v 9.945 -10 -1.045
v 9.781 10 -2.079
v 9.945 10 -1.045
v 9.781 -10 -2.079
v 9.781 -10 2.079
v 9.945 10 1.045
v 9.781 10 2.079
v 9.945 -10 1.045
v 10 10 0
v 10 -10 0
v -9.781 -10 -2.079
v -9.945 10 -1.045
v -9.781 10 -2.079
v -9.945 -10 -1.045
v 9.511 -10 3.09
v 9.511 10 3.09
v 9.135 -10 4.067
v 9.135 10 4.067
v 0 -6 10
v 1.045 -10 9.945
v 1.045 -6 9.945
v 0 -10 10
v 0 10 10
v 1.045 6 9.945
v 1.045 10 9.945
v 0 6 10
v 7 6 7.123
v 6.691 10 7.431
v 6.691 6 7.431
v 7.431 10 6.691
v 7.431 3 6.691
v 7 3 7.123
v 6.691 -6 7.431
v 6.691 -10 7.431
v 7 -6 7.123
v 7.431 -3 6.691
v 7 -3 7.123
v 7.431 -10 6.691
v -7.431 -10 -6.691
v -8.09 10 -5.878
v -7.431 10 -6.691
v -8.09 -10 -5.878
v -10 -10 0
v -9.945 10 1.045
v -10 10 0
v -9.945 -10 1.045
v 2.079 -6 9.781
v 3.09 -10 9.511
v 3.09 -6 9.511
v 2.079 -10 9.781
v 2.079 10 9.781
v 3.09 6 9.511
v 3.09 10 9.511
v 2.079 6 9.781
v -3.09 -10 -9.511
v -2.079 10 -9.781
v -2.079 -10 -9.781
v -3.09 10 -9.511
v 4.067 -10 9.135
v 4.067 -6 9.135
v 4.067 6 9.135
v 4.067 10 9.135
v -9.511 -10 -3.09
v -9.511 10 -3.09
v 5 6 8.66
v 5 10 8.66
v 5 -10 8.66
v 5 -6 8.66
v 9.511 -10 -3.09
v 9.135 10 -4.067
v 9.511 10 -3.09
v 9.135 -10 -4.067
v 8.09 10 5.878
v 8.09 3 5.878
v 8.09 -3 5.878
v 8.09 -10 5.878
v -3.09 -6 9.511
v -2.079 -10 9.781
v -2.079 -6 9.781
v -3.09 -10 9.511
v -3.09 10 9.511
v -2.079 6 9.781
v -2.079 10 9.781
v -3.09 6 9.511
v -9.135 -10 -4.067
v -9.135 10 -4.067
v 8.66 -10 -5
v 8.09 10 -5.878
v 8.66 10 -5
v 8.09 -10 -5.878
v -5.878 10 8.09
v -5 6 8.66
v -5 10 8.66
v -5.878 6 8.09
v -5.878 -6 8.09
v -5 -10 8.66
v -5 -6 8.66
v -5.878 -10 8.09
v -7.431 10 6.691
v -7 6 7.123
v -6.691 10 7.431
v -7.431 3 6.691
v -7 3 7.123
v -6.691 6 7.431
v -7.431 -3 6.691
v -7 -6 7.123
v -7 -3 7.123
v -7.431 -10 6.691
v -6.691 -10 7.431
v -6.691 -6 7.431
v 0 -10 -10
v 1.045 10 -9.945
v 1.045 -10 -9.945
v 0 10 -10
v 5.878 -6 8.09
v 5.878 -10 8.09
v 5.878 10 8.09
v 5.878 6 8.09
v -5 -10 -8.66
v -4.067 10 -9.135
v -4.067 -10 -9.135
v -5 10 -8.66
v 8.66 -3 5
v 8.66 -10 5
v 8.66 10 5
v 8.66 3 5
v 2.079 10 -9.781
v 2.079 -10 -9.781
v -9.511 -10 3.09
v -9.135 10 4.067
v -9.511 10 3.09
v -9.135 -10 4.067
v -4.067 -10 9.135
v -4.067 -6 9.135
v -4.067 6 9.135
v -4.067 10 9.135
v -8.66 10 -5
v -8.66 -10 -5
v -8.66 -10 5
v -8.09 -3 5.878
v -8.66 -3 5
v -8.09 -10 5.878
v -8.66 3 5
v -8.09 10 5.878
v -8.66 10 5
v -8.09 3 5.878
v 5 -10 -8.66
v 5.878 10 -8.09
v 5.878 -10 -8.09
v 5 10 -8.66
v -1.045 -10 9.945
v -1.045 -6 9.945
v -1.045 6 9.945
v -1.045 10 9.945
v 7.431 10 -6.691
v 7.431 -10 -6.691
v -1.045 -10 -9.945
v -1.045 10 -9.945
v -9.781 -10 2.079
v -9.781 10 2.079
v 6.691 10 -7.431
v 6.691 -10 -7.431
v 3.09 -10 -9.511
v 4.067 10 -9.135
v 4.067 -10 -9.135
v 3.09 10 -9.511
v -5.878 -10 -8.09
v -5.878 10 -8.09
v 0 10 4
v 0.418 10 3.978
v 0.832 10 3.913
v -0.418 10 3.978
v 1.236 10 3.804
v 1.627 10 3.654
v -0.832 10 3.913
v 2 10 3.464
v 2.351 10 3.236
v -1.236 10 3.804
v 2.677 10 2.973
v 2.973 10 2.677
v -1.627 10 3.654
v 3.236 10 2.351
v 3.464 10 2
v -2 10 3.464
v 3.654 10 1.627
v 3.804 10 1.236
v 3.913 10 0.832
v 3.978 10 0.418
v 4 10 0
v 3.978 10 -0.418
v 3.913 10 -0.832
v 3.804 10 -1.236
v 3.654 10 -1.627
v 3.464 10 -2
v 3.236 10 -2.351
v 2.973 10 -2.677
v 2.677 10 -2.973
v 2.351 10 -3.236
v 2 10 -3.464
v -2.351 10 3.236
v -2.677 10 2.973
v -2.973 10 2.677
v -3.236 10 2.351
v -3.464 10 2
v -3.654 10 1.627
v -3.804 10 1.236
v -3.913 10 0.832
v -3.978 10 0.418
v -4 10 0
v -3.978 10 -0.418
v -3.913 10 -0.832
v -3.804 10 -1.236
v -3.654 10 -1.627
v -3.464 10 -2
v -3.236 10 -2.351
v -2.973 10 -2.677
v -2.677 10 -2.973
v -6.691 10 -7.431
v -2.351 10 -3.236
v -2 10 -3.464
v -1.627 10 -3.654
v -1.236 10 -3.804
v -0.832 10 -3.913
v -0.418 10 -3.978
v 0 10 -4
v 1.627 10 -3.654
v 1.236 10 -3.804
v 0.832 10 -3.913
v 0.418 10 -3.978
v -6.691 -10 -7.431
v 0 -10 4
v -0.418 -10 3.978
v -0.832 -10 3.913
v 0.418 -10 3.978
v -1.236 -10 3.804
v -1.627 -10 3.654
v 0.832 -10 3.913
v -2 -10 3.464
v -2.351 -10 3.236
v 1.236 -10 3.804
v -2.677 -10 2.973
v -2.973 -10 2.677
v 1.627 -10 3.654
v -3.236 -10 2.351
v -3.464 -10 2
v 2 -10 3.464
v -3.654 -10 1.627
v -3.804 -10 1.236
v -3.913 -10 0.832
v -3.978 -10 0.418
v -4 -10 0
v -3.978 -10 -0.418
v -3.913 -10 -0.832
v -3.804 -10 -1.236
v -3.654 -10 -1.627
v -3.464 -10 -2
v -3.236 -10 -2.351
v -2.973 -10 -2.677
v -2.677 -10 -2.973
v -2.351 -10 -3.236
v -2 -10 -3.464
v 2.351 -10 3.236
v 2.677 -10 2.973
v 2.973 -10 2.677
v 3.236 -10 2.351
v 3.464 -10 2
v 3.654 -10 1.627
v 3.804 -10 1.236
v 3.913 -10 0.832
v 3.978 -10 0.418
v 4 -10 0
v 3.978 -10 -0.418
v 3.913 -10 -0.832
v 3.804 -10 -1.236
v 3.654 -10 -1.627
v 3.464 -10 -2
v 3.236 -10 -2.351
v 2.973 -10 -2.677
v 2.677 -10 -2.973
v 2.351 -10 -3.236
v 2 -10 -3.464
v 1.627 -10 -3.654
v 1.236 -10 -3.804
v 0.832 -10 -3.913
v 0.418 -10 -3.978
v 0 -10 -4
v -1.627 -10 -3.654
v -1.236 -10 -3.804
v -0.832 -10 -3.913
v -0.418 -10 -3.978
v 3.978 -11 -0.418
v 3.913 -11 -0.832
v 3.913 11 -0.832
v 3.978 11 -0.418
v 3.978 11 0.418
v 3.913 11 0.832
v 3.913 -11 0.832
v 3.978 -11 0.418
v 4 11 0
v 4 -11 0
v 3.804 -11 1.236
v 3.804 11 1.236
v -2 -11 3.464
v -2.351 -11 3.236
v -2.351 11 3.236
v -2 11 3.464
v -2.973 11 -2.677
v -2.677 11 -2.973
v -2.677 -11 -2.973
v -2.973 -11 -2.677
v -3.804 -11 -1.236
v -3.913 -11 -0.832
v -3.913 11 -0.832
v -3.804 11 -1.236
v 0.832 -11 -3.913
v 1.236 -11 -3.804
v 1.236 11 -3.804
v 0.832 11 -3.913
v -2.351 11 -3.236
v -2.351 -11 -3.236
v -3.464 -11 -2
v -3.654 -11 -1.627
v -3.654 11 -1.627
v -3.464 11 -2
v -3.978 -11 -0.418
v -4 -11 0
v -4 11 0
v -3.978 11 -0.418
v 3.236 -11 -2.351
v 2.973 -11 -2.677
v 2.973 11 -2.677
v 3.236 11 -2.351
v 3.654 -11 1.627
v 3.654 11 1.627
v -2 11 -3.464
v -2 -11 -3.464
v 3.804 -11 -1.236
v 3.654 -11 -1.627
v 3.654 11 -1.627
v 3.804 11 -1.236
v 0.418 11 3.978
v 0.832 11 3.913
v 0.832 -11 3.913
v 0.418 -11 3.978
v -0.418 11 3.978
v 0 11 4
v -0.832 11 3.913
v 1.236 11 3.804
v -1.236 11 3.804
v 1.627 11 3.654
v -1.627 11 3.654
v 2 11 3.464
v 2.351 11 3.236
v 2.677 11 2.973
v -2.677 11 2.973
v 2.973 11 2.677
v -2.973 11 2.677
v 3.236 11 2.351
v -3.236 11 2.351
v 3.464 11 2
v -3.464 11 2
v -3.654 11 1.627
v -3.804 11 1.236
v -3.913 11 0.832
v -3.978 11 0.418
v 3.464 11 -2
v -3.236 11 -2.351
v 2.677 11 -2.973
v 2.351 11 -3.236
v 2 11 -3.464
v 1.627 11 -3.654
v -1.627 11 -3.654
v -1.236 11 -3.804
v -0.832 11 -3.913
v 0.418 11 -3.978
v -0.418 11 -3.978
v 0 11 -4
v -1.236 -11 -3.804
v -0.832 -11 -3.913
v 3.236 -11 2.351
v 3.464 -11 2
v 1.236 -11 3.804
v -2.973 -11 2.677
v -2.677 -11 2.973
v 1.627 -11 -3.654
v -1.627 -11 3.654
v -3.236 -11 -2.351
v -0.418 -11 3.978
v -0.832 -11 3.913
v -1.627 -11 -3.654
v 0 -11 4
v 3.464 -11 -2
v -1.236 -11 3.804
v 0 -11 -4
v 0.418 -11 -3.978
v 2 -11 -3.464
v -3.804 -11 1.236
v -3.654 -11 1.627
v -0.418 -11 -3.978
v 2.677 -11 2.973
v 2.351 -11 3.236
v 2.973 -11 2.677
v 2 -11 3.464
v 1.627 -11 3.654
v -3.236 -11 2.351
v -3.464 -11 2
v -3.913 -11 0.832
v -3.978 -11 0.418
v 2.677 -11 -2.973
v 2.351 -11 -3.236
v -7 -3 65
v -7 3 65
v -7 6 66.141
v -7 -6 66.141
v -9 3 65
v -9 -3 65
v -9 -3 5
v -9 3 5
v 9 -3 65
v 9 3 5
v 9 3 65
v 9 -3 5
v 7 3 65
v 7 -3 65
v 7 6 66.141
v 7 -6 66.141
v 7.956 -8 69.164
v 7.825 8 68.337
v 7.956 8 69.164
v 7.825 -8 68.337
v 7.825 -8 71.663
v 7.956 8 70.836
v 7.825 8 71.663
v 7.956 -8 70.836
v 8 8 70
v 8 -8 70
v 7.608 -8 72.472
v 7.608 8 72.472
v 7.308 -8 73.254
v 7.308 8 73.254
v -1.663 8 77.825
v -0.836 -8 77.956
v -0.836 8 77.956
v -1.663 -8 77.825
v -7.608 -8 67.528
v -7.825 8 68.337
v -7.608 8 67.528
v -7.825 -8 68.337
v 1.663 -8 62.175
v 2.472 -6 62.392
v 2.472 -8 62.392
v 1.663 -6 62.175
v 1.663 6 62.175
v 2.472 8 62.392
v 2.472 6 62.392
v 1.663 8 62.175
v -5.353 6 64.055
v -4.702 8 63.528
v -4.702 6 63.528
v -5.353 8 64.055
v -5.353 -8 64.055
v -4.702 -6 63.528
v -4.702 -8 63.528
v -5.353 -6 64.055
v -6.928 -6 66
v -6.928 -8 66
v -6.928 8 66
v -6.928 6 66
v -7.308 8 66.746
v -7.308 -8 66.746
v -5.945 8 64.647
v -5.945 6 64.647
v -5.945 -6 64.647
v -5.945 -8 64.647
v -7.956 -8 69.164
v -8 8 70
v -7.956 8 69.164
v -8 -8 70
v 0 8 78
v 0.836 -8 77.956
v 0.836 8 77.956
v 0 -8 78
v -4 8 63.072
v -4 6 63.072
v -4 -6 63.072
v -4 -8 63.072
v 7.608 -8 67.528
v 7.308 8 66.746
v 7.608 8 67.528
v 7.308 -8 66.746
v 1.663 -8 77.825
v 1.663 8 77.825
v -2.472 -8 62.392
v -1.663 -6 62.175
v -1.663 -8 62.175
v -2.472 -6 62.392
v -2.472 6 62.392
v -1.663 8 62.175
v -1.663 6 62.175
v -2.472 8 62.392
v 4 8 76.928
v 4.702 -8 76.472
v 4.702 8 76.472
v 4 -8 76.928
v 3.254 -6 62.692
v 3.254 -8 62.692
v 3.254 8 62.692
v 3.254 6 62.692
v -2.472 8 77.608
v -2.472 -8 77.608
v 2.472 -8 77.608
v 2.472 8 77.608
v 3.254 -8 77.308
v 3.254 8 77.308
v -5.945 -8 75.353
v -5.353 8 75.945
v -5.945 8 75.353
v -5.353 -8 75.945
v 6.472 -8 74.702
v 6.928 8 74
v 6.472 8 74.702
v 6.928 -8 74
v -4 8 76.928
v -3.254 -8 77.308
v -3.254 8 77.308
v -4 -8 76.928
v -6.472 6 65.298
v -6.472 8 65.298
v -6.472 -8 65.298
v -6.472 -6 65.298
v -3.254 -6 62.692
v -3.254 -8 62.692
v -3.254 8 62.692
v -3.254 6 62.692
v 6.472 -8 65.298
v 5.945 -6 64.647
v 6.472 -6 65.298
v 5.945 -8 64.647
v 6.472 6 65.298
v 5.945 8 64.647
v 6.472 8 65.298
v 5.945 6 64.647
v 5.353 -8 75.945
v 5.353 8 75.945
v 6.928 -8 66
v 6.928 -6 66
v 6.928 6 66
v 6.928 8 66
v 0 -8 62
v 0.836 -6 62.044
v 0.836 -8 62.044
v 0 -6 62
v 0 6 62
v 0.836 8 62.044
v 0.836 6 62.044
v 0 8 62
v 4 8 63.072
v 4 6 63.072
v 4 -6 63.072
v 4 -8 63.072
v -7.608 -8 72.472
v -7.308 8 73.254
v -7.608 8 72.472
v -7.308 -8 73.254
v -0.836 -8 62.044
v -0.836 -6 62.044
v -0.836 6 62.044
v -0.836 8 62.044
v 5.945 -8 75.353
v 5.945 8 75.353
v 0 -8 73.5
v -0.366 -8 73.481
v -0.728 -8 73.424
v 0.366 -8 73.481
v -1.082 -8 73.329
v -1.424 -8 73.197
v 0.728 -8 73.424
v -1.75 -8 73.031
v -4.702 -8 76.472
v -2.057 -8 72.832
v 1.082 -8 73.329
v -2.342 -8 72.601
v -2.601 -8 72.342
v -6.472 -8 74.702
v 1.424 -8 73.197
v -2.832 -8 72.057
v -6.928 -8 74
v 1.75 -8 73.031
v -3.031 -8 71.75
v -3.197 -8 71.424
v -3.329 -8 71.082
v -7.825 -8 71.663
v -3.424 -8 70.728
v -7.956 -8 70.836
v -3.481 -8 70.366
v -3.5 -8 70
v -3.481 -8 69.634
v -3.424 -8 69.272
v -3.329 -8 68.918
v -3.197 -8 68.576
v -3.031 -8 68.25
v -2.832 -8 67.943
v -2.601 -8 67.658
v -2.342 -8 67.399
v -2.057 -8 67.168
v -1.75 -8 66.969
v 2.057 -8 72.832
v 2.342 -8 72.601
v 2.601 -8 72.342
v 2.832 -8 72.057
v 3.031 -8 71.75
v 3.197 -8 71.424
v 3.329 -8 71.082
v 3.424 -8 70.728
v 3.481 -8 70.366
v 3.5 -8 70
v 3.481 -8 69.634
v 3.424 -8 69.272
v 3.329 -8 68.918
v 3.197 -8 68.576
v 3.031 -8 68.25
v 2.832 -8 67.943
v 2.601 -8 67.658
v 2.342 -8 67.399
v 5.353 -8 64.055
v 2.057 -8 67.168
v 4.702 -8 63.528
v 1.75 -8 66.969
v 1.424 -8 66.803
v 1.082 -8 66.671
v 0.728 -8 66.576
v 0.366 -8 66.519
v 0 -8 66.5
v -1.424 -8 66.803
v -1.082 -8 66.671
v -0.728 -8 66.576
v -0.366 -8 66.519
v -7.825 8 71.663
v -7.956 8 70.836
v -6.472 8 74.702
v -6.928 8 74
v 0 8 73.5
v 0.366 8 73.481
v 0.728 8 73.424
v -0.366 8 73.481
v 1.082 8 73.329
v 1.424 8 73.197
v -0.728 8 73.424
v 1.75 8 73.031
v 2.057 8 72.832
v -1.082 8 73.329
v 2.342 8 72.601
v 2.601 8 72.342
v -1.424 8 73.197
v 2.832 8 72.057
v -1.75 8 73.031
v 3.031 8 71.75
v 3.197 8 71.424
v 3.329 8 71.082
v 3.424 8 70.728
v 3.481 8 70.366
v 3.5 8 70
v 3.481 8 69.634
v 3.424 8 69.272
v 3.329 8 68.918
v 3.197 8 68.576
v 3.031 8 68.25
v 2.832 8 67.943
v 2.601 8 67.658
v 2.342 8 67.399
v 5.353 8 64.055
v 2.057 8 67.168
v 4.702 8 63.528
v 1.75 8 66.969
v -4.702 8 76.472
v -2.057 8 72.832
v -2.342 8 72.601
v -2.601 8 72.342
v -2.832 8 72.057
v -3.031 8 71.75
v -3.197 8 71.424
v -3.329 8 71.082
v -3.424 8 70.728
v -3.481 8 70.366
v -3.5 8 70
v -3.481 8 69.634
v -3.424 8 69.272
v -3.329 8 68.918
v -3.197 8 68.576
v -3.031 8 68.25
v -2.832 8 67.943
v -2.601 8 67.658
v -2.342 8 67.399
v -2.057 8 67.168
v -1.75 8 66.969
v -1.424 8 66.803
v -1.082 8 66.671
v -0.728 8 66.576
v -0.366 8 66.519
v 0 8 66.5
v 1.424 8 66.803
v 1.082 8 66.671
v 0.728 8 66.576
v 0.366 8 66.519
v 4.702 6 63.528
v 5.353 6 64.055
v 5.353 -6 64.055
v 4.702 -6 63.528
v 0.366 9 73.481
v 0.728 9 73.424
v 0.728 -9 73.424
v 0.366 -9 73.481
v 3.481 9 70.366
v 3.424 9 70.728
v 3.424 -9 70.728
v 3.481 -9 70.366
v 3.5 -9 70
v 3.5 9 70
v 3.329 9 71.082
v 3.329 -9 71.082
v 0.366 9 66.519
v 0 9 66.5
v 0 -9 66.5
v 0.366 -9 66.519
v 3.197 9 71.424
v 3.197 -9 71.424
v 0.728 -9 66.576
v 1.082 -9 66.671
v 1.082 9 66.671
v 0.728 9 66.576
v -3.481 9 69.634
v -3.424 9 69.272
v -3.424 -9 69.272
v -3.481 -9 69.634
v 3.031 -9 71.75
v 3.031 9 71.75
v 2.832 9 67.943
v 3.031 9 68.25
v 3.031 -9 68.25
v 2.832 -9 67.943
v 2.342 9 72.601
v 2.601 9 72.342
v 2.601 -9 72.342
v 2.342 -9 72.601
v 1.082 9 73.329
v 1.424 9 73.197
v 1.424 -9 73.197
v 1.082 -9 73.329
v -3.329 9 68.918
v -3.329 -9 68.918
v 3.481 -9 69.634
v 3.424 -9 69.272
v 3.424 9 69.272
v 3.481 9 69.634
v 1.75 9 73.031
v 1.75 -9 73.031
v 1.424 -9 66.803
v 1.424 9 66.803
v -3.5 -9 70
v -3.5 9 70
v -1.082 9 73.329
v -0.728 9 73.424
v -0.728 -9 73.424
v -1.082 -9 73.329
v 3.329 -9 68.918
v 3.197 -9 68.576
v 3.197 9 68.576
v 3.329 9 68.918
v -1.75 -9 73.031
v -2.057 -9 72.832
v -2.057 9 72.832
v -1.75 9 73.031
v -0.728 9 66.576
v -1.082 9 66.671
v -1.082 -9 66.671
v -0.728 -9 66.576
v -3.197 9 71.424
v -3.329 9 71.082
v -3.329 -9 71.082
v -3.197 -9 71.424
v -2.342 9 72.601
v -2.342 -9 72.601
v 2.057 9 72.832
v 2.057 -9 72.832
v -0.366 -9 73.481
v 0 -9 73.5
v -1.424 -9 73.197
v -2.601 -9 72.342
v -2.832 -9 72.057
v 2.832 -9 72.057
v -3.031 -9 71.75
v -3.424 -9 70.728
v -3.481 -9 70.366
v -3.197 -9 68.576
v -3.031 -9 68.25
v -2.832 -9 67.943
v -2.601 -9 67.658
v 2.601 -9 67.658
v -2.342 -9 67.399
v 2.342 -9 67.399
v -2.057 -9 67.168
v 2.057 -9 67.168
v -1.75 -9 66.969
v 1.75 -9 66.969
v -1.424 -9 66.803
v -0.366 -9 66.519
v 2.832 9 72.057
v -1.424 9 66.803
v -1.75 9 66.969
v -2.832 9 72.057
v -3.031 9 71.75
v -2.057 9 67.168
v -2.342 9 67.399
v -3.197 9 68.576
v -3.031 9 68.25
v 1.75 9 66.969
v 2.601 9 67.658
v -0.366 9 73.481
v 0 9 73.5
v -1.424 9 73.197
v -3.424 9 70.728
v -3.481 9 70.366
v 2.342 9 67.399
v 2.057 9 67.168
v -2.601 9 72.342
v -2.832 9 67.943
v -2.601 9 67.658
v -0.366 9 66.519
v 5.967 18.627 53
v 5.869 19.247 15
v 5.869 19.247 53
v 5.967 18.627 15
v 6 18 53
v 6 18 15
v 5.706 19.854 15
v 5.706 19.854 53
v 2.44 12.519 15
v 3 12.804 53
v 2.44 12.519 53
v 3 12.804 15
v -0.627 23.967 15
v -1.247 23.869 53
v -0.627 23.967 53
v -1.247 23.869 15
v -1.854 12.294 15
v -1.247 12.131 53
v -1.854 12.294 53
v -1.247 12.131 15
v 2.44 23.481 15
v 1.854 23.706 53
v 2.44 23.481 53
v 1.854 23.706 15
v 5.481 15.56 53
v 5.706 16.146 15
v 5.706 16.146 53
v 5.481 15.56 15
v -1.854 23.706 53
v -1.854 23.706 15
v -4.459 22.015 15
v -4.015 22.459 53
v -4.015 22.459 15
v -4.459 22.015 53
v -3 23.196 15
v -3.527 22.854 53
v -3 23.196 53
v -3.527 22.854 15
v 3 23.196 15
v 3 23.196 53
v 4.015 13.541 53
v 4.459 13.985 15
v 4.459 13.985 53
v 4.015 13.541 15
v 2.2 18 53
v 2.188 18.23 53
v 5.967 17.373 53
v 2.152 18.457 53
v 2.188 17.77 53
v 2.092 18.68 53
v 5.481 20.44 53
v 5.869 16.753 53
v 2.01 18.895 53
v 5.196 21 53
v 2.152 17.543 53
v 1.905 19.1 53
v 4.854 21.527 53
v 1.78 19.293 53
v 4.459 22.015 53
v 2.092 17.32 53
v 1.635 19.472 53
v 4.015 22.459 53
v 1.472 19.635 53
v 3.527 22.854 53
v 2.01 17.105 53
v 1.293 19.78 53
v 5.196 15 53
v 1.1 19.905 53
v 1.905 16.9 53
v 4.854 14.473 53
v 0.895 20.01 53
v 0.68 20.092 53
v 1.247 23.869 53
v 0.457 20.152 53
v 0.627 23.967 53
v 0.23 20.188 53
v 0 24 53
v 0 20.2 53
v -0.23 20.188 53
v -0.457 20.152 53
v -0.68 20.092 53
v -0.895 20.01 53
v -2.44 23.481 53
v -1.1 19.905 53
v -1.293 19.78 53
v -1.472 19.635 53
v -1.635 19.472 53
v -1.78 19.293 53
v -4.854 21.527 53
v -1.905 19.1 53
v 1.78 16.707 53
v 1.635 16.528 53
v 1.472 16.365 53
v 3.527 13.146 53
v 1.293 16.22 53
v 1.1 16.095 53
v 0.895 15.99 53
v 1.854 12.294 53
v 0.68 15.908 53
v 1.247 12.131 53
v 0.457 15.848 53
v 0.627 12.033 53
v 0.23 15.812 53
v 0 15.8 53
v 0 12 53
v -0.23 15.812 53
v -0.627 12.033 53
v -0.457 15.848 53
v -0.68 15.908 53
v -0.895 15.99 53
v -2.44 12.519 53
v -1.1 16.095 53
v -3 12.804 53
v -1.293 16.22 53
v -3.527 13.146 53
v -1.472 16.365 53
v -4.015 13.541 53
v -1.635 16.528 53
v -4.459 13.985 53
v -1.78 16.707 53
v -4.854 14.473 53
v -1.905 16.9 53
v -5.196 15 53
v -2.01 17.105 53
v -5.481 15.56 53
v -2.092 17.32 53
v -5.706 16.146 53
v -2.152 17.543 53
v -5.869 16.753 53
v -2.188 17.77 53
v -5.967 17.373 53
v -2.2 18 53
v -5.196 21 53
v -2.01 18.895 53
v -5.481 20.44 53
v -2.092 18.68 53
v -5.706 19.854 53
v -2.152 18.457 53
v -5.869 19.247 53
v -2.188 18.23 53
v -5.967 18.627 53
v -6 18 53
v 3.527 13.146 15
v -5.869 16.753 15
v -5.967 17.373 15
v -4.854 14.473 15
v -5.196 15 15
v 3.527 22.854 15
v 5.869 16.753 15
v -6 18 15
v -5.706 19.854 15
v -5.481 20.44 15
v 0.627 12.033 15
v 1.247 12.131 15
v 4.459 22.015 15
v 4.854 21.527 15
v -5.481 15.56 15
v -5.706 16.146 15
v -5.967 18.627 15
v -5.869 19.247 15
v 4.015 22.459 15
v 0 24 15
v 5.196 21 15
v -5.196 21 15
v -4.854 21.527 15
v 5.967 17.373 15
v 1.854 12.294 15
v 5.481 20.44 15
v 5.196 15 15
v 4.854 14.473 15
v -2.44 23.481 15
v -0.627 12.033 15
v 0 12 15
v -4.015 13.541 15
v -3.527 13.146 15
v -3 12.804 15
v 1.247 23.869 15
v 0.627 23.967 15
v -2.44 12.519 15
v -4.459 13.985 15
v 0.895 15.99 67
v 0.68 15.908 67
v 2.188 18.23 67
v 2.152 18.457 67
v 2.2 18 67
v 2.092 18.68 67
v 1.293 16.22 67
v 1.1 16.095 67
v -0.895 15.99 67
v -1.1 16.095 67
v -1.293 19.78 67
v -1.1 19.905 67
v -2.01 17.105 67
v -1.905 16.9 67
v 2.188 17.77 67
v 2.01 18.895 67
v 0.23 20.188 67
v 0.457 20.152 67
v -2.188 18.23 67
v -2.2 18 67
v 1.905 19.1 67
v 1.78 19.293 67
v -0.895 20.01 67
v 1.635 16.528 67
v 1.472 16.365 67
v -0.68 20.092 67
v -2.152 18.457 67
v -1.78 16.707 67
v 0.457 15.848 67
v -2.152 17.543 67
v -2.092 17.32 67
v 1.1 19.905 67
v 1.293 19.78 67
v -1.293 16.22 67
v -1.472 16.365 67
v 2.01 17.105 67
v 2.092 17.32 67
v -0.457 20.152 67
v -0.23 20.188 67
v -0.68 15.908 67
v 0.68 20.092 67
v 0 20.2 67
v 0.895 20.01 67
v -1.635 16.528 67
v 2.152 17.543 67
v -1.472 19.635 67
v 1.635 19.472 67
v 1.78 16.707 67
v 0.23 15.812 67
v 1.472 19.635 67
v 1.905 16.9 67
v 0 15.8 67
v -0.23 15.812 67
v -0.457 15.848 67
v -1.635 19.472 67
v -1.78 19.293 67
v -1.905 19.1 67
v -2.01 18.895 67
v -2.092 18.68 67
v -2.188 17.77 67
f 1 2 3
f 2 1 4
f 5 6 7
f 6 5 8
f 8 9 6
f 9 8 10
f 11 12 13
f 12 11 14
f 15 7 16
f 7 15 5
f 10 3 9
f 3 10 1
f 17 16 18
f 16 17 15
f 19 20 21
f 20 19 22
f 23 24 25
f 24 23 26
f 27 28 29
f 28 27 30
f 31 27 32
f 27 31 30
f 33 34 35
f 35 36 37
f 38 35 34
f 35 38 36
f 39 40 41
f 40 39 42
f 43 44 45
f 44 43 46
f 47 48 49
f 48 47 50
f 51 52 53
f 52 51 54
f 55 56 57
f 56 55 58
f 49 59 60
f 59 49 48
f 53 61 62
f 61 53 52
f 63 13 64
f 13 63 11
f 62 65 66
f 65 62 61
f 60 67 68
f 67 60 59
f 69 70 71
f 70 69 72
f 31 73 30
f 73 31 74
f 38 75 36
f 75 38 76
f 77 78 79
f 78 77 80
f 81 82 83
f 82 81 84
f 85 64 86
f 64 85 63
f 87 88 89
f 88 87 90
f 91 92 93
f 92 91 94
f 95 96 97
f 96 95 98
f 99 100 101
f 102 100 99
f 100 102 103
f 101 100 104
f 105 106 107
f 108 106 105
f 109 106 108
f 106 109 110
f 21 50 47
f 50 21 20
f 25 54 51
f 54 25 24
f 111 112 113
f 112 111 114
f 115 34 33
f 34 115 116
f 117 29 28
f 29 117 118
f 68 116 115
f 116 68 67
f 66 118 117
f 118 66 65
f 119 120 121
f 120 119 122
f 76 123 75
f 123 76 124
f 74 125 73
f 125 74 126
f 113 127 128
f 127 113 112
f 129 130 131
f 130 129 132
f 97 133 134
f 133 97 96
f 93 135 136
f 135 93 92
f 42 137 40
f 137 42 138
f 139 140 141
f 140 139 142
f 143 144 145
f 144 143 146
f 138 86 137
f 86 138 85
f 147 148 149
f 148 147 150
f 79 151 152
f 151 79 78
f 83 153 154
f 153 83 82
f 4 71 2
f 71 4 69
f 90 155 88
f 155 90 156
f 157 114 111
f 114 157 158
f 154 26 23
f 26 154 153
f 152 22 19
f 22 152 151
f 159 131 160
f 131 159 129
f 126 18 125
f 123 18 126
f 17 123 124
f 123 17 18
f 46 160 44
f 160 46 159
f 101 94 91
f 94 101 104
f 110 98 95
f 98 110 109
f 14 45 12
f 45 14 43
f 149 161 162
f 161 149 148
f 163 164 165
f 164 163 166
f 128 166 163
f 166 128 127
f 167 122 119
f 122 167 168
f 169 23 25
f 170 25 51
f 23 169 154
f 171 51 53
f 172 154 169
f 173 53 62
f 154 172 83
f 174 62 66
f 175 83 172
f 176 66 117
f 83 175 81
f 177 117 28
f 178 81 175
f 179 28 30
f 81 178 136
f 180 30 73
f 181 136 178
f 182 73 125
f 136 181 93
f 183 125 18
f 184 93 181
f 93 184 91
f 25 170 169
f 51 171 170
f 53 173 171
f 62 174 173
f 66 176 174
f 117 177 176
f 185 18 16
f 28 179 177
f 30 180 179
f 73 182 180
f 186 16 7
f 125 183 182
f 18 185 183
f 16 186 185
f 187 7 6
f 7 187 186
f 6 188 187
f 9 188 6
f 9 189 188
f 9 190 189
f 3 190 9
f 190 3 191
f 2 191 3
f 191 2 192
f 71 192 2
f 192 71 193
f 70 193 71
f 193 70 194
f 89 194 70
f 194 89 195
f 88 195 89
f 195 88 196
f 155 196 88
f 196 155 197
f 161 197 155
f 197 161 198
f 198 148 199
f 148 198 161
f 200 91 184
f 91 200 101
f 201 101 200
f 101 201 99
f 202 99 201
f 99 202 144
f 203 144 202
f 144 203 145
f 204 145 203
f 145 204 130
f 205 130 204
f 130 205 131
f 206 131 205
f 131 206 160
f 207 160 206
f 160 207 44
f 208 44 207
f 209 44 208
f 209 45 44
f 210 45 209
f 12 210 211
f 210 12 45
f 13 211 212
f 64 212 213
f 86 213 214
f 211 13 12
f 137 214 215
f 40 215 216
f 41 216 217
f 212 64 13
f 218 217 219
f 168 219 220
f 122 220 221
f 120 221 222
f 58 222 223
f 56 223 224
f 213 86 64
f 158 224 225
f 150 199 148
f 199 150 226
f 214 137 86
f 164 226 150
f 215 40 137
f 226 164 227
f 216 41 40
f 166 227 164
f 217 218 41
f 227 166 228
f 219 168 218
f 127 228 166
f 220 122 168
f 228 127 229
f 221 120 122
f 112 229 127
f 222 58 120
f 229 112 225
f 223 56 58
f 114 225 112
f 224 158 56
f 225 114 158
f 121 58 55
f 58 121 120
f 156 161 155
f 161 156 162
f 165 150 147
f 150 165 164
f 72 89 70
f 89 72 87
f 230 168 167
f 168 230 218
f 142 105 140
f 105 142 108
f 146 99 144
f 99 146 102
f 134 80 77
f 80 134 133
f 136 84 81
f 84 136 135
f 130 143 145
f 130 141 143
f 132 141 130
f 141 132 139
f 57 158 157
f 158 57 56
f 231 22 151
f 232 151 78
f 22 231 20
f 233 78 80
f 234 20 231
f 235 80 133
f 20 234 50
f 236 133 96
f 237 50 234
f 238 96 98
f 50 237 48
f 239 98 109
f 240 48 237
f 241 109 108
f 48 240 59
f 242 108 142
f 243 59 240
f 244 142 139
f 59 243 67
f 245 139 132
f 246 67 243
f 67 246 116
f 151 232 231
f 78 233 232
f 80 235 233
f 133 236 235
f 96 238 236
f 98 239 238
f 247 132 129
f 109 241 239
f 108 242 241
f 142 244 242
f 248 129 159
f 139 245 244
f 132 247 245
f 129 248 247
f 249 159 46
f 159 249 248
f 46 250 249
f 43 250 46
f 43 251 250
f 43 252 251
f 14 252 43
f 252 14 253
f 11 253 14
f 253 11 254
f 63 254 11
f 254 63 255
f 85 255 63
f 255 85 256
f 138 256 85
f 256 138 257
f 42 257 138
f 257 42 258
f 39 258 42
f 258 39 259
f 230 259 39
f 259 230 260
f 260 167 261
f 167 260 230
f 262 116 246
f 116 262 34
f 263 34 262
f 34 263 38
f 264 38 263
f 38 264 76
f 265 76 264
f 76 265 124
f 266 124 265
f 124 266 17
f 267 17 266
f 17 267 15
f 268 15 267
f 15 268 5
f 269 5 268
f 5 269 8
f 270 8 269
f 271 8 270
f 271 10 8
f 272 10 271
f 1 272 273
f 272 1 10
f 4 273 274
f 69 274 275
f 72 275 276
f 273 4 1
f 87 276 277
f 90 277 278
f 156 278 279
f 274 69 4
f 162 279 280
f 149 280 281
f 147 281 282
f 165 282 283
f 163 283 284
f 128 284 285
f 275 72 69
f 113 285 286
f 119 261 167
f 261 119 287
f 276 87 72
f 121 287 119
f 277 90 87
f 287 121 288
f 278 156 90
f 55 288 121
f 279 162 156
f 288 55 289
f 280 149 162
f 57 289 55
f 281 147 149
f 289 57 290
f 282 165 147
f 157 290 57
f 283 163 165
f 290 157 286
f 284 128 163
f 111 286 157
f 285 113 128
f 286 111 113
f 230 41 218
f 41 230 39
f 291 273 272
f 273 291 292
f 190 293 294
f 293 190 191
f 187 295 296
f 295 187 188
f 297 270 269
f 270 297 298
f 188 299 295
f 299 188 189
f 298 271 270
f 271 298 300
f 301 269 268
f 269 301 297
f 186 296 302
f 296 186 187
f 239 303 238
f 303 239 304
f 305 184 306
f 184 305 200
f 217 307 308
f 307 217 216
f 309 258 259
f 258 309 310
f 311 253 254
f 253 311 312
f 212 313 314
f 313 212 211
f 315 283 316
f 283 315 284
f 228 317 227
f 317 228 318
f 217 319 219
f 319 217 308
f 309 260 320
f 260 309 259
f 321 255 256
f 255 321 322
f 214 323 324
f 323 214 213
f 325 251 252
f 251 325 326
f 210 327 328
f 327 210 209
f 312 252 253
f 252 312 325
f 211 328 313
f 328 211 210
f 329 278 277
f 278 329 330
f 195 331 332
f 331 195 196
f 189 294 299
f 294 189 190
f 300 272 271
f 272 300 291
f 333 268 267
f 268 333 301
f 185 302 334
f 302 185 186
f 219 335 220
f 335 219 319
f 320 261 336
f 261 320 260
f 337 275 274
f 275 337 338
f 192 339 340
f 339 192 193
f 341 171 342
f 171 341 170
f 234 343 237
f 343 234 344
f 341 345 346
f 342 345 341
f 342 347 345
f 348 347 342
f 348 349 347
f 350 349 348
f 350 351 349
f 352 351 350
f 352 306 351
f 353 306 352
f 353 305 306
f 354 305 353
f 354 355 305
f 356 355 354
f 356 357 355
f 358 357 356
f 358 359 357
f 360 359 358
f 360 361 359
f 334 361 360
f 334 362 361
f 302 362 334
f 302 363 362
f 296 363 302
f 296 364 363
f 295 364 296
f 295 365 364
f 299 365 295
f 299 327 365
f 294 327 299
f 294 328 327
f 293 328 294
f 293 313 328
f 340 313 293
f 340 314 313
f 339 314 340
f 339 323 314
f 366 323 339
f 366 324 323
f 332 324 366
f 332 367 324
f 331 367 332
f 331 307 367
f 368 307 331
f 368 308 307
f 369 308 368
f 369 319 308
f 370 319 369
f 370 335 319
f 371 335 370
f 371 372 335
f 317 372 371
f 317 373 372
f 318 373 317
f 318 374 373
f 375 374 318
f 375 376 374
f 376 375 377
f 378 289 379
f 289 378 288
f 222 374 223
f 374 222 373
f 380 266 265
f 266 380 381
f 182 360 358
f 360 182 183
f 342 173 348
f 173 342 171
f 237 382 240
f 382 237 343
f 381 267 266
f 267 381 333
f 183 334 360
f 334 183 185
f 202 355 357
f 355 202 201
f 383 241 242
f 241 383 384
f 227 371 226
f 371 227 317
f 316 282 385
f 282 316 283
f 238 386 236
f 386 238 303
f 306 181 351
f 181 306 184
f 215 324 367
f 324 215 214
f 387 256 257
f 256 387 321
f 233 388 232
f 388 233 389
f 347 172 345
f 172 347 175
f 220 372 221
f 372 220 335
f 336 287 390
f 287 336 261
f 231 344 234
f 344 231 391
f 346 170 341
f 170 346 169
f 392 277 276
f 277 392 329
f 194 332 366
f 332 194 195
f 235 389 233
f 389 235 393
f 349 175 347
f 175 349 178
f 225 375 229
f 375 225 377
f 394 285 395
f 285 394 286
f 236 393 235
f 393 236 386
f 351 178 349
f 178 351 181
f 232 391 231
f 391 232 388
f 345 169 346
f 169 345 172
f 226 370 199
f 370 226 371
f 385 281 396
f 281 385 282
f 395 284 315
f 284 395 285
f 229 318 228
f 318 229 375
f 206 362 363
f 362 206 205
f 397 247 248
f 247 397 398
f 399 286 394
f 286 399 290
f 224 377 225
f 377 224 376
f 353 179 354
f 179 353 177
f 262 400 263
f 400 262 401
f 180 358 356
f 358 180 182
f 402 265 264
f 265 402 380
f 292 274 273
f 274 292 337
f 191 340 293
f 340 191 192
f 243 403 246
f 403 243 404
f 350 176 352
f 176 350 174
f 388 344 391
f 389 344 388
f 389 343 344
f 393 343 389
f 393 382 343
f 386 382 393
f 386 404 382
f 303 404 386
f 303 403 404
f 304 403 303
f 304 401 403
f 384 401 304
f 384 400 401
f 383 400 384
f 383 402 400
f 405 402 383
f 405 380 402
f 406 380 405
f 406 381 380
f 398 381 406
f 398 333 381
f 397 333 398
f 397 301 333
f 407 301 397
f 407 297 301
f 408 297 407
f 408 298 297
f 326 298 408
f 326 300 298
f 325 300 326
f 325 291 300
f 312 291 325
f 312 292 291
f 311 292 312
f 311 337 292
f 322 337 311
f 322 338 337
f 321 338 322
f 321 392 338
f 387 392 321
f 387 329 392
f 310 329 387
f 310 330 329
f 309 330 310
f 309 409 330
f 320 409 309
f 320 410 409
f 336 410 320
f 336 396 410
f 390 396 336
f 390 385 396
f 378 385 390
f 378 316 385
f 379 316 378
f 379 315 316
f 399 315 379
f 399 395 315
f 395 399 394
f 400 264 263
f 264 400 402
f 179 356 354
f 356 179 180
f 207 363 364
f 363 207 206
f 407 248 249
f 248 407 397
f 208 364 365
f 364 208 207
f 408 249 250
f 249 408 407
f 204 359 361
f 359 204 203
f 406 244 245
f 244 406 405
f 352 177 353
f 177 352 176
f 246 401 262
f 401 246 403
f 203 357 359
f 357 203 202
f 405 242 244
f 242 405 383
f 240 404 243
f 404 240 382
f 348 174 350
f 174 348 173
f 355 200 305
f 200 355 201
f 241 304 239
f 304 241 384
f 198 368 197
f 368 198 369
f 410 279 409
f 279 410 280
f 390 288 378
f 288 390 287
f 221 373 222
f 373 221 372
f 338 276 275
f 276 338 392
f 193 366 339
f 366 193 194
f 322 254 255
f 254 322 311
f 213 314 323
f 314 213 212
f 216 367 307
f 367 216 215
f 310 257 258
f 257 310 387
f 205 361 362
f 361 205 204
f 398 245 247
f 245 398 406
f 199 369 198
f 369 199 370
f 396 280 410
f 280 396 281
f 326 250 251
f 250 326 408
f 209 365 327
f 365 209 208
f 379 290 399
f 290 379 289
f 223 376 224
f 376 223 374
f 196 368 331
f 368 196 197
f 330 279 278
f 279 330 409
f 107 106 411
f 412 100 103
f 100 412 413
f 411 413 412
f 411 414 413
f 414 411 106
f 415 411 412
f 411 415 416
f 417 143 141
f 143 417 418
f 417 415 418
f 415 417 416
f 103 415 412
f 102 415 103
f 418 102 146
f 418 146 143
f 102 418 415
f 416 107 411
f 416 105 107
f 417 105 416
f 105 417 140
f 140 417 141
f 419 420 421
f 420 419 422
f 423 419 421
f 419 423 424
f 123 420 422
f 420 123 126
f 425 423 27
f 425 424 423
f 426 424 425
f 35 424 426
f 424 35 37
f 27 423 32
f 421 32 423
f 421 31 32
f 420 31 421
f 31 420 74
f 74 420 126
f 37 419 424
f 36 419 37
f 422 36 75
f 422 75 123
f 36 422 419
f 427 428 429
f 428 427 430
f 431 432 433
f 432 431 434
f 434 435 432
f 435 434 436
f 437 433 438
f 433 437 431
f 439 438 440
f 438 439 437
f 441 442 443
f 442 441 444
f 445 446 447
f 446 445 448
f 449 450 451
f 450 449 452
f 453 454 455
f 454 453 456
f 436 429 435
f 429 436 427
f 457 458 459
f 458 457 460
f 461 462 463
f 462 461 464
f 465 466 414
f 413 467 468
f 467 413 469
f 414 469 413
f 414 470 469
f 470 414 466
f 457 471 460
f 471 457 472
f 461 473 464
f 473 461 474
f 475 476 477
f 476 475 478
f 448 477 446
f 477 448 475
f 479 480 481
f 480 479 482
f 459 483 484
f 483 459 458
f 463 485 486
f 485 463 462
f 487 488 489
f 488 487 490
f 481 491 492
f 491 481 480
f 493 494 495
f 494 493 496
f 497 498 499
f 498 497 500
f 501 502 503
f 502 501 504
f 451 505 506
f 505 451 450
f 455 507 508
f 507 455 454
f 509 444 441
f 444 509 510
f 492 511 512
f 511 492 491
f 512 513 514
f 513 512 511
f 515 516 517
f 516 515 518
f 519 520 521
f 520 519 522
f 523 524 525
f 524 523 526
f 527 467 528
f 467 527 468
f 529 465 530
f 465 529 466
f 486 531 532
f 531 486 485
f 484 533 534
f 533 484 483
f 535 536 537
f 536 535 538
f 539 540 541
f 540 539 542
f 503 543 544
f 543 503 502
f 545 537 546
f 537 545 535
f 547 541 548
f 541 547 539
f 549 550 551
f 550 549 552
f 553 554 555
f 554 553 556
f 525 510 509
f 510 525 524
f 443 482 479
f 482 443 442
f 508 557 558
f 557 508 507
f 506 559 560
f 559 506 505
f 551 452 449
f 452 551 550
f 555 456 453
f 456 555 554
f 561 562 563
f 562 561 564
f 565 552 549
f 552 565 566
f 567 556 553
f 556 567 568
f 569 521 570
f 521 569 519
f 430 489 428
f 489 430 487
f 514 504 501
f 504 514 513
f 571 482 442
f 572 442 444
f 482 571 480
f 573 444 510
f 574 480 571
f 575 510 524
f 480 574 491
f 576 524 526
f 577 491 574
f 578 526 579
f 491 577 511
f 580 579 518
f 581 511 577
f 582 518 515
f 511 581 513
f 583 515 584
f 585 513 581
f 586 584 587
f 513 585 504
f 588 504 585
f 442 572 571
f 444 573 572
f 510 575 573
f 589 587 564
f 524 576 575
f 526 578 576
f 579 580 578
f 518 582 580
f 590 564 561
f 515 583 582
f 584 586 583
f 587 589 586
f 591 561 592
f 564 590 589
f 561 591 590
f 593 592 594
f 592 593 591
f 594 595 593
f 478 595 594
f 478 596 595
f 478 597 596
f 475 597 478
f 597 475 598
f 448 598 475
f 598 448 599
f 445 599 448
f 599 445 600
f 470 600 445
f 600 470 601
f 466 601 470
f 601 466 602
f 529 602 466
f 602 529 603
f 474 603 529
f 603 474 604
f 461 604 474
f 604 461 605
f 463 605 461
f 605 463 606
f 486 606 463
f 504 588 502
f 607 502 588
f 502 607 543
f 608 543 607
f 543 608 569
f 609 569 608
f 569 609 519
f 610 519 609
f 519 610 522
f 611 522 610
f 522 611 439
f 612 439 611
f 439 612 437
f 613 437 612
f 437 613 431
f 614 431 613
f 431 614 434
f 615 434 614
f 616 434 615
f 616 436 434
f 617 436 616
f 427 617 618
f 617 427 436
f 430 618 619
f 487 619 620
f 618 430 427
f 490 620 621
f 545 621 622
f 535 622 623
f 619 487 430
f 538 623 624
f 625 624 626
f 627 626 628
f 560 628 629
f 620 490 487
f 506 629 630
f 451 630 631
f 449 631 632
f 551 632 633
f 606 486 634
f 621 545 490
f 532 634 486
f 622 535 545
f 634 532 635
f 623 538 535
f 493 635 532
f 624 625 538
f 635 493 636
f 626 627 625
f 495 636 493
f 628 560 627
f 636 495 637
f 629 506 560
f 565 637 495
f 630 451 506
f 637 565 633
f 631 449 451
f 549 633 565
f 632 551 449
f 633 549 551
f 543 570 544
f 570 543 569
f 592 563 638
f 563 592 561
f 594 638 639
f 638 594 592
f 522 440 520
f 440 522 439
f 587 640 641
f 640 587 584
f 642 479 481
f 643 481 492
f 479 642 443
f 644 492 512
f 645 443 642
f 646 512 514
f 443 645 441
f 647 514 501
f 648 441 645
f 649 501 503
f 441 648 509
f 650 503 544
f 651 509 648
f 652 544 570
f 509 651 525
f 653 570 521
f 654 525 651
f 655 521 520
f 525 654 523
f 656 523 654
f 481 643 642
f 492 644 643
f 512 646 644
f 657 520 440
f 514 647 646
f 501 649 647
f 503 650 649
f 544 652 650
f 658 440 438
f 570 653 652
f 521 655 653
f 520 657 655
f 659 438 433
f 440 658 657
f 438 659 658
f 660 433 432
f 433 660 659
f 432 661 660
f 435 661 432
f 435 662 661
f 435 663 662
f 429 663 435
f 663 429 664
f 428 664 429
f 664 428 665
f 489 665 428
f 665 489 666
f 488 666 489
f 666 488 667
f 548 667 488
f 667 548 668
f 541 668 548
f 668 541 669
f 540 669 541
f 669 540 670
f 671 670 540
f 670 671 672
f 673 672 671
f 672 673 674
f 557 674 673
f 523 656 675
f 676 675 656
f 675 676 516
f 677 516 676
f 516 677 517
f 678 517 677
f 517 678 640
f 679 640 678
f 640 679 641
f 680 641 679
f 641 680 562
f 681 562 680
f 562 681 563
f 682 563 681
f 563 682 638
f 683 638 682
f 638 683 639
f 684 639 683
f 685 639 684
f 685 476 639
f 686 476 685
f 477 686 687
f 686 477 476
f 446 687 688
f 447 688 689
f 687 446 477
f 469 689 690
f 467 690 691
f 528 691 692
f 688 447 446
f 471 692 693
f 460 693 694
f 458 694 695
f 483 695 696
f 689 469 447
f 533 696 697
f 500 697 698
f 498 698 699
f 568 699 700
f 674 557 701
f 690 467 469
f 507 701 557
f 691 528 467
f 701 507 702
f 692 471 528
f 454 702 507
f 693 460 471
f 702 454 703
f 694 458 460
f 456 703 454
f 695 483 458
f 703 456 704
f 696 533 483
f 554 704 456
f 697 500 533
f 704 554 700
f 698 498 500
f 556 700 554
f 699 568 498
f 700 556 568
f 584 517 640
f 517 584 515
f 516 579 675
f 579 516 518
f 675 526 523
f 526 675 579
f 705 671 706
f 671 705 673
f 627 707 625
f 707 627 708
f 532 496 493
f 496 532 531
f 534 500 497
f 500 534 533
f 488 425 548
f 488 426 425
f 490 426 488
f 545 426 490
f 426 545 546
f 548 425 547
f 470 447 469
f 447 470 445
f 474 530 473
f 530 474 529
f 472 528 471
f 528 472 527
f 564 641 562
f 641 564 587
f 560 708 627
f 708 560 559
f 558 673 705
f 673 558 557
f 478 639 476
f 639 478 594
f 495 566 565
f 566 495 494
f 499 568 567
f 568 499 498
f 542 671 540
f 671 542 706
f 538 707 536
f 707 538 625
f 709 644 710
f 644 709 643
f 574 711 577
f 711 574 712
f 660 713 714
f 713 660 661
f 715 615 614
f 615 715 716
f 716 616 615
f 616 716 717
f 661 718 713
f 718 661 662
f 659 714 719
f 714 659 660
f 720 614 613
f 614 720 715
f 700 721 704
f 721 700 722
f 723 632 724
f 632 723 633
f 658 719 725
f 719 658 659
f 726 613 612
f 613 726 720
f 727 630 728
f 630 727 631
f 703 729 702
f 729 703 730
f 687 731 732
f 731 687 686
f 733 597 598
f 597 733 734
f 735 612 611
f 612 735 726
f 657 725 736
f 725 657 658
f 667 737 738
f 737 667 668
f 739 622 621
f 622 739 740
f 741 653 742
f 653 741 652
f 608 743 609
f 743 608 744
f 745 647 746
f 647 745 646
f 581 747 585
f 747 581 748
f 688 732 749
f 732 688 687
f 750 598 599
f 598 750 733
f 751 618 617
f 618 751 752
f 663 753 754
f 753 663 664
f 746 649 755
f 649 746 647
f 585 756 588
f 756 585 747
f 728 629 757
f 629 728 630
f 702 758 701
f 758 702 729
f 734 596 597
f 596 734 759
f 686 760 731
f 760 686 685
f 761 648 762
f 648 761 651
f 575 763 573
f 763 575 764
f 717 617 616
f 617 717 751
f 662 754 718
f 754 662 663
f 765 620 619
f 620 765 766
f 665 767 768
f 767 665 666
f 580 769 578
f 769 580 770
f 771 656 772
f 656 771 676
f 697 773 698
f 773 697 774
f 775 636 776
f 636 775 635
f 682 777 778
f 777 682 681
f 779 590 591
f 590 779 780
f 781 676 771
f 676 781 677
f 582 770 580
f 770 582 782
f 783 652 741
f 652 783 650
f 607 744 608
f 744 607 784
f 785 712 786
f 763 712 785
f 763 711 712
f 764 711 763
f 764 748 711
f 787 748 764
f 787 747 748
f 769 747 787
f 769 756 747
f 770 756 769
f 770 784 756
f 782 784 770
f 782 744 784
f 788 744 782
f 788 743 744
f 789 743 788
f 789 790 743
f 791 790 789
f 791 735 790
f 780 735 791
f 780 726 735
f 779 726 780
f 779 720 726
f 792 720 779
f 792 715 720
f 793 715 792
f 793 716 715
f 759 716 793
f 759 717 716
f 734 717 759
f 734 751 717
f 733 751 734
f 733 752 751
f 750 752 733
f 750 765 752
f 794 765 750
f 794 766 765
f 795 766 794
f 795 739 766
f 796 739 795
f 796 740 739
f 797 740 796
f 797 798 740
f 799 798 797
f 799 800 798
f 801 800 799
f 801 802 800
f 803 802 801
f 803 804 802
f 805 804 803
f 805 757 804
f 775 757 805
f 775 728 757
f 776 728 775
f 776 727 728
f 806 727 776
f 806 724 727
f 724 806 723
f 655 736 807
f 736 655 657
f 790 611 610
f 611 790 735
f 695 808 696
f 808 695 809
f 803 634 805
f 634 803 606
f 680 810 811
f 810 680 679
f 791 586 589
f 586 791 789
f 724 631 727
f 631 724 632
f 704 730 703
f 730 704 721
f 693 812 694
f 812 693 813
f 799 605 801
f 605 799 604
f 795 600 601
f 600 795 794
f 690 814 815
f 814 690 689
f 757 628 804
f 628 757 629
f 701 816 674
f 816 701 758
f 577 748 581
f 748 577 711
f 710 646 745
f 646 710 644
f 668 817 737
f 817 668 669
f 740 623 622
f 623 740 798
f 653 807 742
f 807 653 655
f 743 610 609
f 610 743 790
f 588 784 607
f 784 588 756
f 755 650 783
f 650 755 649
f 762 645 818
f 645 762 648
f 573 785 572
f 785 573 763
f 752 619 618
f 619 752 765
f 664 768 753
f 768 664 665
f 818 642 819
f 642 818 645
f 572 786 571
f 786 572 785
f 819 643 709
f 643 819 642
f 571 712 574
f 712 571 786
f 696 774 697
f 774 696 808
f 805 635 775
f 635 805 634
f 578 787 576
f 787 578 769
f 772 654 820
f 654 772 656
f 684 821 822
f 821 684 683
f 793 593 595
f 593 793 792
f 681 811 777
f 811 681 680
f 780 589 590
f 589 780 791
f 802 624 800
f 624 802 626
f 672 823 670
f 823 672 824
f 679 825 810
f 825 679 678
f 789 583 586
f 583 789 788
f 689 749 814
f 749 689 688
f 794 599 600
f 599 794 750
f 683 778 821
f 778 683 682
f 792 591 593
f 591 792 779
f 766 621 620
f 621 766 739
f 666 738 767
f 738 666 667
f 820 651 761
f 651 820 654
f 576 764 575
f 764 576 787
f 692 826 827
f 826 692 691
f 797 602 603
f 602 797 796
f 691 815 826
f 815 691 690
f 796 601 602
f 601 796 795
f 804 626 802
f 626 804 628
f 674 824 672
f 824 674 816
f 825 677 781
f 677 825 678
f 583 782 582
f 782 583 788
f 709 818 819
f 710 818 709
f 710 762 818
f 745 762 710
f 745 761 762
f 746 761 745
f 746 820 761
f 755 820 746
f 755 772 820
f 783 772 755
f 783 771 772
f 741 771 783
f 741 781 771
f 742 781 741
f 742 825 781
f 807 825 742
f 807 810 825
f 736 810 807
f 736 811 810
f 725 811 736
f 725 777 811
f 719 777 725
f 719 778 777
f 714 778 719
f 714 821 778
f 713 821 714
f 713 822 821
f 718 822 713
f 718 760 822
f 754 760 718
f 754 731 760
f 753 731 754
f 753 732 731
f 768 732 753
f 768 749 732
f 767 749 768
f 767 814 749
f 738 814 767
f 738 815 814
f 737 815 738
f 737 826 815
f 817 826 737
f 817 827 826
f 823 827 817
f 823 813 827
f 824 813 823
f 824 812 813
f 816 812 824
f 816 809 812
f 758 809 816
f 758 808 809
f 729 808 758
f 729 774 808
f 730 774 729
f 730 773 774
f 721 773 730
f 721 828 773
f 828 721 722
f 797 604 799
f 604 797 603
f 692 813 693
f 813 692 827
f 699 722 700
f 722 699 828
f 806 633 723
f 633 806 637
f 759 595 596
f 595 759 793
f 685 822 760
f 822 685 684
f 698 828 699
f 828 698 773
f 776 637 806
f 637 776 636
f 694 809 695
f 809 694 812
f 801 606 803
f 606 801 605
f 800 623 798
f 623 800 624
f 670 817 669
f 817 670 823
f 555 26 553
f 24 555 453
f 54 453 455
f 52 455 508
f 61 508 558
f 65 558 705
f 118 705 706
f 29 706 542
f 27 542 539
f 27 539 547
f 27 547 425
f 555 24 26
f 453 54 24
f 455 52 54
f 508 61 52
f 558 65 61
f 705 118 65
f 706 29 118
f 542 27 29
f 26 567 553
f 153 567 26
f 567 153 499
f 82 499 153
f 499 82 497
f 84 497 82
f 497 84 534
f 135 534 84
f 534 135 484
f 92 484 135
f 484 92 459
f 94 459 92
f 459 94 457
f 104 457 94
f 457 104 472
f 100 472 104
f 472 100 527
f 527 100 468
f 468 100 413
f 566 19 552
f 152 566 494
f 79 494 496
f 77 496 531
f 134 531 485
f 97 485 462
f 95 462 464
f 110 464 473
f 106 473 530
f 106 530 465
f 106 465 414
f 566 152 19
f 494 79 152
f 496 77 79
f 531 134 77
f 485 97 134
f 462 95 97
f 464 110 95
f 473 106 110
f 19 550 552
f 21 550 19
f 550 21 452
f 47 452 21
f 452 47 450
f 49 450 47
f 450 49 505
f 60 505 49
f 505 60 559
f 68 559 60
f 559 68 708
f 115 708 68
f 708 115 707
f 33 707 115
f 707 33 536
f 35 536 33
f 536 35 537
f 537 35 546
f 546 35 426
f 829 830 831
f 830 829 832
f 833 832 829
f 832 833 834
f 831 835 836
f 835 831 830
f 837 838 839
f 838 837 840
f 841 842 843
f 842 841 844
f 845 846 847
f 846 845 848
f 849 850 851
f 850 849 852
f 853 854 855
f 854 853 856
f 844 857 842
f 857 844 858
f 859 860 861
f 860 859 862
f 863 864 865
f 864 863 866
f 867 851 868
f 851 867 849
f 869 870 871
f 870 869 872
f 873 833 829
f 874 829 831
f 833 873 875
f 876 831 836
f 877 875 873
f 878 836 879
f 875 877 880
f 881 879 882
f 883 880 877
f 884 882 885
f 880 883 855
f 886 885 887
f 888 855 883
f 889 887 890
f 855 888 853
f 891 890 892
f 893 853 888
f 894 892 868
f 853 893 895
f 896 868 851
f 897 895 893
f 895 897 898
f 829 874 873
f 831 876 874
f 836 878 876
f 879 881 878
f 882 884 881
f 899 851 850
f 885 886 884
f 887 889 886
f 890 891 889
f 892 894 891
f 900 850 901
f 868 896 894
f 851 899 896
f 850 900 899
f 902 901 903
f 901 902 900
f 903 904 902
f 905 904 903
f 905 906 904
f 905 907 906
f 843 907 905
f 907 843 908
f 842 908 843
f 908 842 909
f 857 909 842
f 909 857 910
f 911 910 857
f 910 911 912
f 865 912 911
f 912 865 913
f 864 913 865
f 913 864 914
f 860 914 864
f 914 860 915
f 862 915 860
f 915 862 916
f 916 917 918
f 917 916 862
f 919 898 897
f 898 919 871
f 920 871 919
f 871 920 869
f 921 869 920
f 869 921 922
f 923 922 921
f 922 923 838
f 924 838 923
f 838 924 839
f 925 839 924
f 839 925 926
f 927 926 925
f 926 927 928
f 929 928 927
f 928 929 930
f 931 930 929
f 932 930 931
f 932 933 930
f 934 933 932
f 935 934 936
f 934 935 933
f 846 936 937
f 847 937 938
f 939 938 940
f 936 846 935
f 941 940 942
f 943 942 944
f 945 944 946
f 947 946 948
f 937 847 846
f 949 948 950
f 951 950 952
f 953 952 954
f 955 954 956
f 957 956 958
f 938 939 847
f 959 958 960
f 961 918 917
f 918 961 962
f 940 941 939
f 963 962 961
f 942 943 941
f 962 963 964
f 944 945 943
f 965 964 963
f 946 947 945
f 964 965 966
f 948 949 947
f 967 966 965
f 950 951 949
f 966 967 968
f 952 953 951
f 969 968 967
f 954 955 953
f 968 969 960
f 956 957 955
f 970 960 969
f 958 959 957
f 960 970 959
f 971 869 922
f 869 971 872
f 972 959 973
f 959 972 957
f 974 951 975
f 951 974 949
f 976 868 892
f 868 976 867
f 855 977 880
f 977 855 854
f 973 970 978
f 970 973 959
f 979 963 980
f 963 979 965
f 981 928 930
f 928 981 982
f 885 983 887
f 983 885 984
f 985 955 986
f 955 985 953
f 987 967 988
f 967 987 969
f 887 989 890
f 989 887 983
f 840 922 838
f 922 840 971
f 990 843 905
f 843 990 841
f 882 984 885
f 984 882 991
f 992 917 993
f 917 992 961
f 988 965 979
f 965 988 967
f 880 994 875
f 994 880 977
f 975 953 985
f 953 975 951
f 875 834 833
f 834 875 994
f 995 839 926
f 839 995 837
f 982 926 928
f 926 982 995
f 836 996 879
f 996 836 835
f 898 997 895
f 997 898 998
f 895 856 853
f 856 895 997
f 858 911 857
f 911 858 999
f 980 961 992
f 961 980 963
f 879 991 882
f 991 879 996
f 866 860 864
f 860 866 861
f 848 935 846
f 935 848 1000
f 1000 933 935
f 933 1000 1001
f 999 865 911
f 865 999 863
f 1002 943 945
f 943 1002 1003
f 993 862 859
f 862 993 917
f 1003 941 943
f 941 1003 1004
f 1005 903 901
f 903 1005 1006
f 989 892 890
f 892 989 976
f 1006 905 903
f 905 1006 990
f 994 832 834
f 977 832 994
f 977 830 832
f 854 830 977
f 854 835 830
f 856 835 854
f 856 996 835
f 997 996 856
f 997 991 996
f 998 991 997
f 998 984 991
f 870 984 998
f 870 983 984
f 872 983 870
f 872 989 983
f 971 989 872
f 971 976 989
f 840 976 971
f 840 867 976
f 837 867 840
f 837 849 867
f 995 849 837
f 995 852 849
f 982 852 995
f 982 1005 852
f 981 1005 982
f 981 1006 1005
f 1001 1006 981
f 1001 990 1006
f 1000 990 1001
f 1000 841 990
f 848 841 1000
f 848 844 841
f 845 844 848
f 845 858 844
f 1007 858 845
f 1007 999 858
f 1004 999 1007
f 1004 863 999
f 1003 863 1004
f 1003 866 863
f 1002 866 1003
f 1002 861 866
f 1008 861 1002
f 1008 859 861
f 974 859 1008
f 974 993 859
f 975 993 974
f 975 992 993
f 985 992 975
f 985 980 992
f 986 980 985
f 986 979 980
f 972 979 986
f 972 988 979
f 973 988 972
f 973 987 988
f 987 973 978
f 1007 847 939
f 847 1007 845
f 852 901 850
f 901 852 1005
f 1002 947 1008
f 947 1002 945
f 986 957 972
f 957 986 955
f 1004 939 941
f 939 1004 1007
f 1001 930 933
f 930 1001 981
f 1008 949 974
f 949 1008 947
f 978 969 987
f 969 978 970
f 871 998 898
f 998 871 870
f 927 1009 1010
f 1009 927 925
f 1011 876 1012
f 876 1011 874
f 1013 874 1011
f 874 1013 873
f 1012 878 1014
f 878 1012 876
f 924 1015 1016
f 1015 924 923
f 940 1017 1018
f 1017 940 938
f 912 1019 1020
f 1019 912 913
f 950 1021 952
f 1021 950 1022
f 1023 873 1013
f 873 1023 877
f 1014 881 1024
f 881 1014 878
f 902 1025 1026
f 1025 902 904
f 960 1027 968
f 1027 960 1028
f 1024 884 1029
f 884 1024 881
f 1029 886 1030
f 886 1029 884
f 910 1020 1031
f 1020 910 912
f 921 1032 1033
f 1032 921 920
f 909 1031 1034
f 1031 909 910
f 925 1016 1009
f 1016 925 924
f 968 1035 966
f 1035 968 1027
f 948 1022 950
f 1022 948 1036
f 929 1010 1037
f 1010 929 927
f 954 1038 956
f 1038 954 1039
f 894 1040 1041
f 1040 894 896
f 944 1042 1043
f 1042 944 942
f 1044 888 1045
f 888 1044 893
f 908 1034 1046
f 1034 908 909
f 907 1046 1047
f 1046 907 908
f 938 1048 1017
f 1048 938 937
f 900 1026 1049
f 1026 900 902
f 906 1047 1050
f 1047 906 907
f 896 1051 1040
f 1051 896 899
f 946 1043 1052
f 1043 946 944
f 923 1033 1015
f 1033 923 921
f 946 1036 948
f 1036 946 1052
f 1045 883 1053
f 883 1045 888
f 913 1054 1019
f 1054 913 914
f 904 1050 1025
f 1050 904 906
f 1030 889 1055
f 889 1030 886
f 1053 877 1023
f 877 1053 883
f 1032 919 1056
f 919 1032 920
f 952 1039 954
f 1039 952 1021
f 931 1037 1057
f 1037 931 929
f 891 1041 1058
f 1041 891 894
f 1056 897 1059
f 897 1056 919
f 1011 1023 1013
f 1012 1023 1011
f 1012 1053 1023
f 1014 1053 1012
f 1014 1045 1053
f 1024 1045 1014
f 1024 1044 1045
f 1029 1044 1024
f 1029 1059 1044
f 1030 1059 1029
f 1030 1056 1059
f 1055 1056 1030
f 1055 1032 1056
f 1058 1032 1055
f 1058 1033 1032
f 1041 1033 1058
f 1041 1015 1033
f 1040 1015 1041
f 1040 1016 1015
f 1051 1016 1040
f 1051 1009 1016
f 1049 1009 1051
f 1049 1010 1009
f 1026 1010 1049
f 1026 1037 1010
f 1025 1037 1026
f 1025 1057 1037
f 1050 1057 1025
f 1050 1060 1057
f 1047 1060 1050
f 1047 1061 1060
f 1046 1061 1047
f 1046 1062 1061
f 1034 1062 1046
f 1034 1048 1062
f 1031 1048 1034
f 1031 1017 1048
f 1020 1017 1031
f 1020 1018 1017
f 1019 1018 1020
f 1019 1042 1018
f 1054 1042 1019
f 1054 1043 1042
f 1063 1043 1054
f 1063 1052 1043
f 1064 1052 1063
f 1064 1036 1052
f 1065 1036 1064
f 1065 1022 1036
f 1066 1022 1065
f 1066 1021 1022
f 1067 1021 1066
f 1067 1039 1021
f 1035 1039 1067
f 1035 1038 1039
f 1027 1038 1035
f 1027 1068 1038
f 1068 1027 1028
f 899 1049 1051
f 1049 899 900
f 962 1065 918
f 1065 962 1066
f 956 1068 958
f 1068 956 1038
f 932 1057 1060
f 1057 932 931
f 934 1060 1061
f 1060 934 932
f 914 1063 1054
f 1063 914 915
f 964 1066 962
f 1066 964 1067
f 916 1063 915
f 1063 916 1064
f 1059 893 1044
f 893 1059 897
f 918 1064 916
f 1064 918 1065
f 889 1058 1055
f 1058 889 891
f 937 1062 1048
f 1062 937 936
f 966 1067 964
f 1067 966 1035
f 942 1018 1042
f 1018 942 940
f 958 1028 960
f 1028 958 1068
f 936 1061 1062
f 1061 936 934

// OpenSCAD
// file: _common.scad
// mechanism 共用設定 + 齒輪 module
$fn = 60;

// 簡化齒輪：N 個齒、節圓半徑 r、齒高 h、齒寬 w
module simple_gear(N = 16, r = 20, h = 4, thick = 6) {
  union() {
    // 主圓盤
    cylinder(h = thick, r = r, center = true);
    // 齒（梯形）
    for (i = [0:N-1]) {
      rotate([0, 0, i * 360 / N])
        translate([r, 0, 0])
          linear_extrude(height = thick, center = true)
            polygon([[0, -2.4], [h, -1.4], [h, 1.4], [0, 2.4]]);
    }
    // 中心凸軸
    cylinder(h = thick * 1.4, r = r * 0.18, center = true);
  }
}
// main file
// 軸3：小臂（前臂）— 肘關節 + 小臂
include <_common.scad>

// 肘關節
color([0.40, 0.40, 0.43]) {
  rotate([90, 0, 0]) cylinder(h = 20, r = 10, center = true);
  color([0.15, 0.15, 0.15]) rotate([90, 0, 0]) cylinder(h = 22, r = 4, center = true);
}

// 小臂本體（略細）
color([0.52, 0.54, 0.57])
  translate([-7, -6, 0]) cube([14, 12, 70]);

// 加強肋
color([0.47, 0.48, 0.51]) {
  translate([-9, -3, 5]) cube([2, 6, 60]);
  translate([7, -3, 5]) cube([2, 6, 60]);
}

// 腕關節（末端）
color([0.40, 0.40, 0.43])
  translate([0, 0, 70]) {
    rotate([90, 0, 0]) cylinder(h = 16, r = 8, center = true);
    color([0.15, 0.15, 0.15]) rotate([90, 0, 0]) cylinder(h = 18, r = 3.5, center = true);
  }

// 針筒（肘控制）
color([0.70, 0.78, 0.85, 0.75])
  translate([0, 18, 15]) cylinder(h = 38, r = 6);
color([0.60, 0.60, 0.65])
  translate([0, 18, 53]) cylinder(h = 14, r = 2.2);
